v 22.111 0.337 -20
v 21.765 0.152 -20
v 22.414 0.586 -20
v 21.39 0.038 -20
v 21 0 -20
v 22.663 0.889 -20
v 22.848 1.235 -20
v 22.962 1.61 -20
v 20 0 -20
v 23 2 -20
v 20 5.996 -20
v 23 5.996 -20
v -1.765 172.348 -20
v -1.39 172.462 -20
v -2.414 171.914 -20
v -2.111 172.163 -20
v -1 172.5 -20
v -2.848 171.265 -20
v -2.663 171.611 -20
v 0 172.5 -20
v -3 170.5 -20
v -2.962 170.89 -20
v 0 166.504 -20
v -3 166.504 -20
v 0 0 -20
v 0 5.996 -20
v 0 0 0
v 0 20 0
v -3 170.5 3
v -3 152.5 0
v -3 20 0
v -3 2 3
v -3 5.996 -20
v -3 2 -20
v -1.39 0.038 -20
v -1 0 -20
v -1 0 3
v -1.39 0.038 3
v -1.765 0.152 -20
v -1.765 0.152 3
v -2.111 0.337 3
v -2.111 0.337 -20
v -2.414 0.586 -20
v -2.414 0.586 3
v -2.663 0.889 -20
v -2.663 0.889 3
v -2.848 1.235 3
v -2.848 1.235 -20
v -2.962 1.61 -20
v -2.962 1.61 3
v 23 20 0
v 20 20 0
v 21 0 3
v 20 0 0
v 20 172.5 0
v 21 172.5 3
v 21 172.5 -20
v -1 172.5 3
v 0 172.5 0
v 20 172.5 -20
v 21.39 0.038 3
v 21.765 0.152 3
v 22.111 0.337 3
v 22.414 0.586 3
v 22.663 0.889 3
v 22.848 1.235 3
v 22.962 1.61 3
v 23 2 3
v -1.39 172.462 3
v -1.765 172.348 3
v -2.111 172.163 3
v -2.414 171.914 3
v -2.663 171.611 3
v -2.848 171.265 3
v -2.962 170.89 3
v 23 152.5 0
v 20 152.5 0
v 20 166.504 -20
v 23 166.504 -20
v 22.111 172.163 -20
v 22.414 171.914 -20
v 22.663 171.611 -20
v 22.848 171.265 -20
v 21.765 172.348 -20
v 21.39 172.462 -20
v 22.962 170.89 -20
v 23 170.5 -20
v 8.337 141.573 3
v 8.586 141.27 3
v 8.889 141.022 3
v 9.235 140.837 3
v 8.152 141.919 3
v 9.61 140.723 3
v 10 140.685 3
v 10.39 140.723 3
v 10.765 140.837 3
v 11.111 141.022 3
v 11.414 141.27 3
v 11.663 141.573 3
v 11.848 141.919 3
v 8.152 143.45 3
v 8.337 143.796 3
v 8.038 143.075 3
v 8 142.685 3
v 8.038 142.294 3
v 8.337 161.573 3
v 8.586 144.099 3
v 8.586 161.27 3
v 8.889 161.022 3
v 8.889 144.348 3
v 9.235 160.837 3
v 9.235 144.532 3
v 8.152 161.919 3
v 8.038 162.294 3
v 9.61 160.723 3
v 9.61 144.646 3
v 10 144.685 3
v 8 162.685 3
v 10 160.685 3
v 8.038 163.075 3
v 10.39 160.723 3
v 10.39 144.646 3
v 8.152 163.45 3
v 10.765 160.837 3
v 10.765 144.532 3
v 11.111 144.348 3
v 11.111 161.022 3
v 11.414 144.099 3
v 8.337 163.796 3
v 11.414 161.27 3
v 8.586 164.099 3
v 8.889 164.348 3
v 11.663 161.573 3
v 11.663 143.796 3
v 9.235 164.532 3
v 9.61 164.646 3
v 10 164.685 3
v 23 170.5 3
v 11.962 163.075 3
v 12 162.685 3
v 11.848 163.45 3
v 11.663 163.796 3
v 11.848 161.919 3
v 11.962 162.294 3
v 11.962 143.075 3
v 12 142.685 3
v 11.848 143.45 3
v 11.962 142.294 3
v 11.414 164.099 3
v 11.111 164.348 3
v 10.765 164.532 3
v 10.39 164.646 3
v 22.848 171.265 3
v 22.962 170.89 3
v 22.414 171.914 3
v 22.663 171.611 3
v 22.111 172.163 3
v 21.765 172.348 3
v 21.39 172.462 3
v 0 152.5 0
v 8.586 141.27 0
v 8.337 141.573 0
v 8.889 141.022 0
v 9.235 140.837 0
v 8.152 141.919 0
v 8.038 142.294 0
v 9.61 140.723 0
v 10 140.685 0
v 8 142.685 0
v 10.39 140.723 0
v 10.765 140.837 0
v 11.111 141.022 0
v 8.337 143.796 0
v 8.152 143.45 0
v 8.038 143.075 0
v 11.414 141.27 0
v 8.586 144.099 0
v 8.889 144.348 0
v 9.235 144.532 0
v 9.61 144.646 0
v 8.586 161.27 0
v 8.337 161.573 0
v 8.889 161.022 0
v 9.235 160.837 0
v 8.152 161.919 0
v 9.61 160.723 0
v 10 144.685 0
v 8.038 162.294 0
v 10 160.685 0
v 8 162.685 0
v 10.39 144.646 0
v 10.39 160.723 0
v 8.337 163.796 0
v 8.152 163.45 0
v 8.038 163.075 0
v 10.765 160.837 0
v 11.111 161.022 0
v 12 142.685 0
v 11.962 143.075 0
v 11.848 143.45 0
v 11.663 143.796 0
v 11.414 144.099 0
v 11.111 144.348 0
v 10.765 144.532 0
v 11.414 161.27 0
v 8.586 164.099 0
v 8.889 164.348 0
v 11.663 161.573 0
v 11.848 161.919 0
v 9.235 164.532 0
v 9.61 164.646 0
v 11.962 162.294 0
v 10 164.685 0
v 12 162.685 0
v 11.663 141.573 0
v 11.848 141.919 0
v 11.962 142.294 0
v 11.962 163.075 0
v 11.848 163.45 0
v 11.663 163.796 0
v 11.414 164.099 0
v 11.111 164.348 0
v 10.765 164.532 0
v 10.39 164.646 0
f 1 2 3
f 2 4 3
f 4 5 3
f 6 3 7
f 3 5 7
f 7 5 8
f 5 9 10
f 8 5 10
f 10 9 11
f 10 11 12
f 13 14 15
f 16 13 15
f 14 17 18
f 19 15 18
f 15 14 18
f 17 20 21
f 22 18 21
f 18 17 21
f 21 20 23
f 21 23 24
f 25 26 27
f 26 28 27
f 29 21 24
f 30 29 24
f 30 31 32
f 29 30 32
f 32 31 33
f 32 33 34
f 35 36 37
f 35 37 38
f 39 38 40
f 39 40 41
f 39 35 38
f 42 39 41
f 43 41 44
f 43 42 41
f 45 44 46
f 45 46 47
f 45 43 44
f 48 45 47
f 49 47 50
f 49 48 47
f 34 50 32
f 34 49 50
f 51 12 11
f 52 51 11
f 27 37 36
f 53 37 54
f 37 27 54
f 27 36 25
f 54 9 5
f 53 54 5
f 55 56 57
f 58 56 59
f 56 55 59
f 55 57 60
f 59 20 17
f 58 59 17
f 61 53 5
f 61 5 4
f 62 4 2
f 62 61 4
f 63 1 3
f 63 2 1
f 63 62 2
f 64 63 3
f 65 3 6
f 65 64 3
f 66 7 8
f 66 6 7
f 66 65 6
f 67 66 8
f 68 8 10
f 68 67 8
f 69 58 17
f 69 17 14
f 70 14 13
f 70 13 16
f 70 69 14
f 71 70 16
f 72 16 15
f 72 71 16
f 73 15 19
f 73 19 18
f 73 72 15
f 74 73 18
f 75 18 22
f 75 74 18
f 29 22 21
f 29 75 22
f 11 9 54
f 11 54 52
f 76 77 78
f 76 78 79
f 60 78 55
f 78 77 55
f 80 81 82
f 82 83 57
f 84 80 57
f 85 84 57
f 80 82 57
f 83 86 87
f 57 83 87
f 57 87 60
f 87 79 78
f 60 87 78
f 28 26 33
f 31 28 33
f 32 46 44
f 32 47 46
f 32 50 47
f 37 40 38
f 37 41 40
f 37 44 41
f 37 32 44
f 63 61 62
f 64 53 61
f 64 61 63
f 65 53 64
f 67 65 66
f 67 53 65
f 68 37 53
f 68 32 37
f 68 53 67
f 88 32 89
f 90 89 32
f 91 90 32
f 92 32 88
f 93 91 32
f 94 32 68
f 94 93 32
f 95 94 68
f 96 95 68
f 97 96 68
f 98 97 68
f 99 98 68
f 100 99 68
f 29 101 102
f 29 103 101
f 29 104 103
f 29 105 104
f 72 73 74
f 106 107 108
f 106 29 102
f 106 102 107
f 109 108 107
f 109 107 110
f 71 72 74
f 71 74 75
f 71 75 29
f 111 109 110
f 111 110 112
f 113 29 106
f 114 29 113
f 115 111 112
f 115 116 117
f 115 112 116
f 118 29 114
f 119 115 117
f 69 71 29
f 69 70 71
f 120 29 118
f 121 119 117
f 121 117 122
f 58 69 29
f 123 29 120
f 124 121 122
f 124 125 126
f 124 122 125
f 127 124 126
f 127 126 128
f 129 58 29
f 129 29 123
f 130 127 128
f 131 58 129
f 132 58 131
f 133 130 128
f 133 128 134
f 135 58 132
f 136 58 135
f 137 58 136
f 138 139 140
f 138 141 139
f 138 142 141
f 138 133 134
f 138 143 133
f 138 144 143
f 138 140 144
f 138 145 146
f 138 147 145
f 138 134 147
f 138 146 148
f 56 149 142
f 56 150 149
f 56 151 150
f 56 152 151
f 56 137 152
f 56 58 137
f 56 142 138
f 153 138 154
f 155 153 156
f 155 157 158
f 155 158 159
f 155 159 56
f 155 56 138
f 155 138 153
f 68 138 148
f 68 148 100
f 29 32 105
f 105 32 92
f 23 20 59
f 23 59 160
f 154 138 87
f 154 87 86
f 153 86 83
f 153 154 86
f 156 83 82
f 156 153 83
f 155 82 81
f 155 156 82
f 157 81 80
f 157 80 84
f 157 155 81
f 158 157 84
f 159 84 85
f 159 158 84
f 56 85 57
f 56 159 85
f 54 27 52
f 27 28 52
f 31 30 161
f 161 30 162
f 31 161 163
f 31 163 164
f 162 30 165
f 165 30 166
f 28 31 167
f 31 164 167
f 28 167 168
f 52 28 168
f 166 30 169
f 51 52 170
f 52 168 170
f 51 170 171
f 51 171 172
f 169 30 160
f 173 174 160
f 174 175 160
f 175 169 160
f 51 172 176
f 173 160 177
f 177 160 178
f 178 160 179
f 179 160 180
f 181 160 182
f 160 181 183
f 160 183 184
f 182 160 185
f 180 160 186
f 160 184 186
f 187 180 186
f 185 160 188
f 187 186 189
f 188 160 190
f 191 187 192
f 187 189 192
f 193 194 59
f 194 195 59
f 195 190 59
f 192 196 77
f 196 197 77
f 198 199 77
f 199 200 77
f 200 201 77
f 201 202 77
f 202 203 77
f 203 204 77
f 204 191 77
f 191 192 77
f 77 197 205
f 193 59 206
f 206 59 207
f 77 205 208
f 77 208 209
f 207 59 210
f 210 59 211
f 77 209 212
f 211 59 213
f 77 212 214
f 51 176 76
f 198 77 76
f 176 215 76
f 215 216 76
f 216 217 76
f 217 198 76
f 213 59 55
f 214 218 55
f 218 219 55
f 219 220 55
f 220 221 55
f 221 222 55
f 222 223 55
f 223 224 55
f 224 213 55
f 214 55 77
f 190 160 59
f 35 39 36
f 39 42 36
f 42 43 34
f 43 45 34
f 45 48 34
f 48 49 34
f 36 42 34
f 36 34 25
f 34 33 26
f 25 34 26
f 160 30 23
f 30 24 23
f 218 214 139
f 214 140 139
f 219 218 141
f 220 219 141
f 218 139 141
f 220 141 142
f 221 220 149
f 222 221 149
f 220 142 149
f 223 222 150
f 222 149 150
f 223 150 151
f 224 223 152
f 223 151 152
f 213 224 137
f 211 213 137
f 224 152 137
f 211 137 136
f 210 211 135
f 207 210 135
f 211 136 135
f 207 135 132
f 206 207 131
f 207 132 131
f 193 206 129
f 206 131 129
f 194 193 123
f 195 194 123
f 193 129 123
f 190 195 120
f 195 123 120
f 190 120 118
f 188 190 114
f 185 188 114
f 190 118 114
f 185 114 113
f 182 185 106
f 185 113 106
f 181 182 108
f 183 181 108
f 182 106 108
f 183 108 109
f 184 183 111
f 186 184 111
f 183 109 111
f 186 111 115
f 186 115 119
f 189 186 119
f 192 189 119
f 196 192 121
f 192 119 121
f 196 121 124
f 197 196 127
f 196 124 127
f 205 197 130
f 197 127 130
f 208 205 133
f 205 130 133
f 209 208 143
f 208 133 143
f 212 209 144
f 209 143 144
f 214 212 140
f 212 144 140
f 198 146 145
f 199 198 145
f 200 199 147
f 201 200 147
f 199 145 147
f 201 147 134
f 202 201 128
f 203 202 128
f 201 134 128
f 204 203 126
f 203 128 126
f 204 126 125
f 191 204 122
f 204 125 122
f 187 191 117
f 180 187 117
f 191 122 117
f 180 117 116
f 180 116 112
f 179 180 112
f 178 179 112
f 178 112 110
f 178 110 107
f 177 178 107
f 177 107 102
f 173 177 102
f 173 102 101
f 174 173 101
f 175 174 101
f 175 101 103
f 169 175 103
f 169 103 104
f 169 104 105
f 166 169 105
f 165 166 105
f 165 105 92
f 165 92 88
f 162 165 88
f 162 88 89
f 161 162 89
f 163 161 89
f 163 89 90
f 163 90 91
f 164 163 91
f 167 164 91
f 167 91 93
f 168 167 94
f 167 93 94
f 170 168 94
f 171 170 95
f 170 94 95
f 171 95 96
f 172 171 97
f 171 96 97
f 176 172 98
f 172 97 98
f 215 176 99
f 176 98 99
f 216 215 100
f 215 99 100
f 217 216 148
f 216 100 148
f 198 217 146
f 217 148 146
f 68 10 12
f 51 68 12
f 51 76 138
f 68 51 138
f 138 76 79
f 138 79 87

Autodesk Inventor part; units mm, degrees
ref_plane "YZ Plane" through (0, 0, 0) normal (1, 0, 0) x (0, 1, 0)
ref_plane "XZ Plane" through (0, 0, 0) normal (0, 1, 0) x (-1, 0, 0)
sketch "Sketch1" plane through (0, 0, 0) normal (0, 0, 1) x (1, 0, 0)
  line L0 (0, 0) -> (20, 0)
  line L1 (20, 0) -> (20, 172.5)
  line L2 (20, 172.5) -> (0, 172.5)
  line L3 (0, 172.5) -> (0, 0)
  line L4 (0, 0) -> (0, 172.5)
  line L5 (0, 172.5) -> (-3, 172.5)
  line L6 (-3, 172.5) -> (-3, 0)
  line L7 (-3, 0) -> (0, 0)
  line L8 (20, 172.5) -> (20, 0)
  line L9 (20, 0) -> (23, 0)
  line L10 (23, 0) -> (23, 172.5)
  line L11 (23, 172.5) -> (20, 172.5)
  line L12 (23, 20) -> (-3, 20)
  point P0 (0, 20)
  point P1 (20, 20)
  dimension "d0" = 20
  dimension "d1" = 172.5
  dimension "d2" = 3
  dimension "d3" = 3
  dimension "d6" = 20
extrude "Extrusion1" add sketch "Sketch1" along normal blind 3
extrude "Extrusion2" add sketch "Sketch1" against normal blind 20 contours L7 L6 L12 L3 | L1 L12 L10 L9
chamfer "Chamfer1" distance 20 angle 35 1 edges at (-1.5, 20, -20) measured on face at (-1, 20, -6.6667)
chamfer "Chamfer2" distance 20 angle 35 1 edges at (21.5, 20, -20) measured on face at (22, 20, -6.6667)
sketch "Sketch2" plane through (0, 0, 3) normal (0, 0, 1) x (1, 0, 0)
  circle A0 centre (10, 162.6846) radius 2 projected
  circle A1 centre (10, 142.6846) radius 2 projected
  point P0 (0, 0)
extrude "Extrusion3" cut sketch "Sketch2" against normal through all
ref_plane "Work Plane2" through (-3, 86.25, 0) normal (0, 1, 0) x (1, 0, 0)
mirror "Mirror2" about plane through (-3, 86.25, 0) normal (0, 1, 0) of "Extrusion2", "Chamfer1", "Chamfer2"
fillet "Fillet1" radius 2 4 edges at (23, 0, -8.5) (-3, 0, -8.5) (23, 172.5, -8.5) (-3, 172.5, -8.5)
properties part number "Z Drill Template"
